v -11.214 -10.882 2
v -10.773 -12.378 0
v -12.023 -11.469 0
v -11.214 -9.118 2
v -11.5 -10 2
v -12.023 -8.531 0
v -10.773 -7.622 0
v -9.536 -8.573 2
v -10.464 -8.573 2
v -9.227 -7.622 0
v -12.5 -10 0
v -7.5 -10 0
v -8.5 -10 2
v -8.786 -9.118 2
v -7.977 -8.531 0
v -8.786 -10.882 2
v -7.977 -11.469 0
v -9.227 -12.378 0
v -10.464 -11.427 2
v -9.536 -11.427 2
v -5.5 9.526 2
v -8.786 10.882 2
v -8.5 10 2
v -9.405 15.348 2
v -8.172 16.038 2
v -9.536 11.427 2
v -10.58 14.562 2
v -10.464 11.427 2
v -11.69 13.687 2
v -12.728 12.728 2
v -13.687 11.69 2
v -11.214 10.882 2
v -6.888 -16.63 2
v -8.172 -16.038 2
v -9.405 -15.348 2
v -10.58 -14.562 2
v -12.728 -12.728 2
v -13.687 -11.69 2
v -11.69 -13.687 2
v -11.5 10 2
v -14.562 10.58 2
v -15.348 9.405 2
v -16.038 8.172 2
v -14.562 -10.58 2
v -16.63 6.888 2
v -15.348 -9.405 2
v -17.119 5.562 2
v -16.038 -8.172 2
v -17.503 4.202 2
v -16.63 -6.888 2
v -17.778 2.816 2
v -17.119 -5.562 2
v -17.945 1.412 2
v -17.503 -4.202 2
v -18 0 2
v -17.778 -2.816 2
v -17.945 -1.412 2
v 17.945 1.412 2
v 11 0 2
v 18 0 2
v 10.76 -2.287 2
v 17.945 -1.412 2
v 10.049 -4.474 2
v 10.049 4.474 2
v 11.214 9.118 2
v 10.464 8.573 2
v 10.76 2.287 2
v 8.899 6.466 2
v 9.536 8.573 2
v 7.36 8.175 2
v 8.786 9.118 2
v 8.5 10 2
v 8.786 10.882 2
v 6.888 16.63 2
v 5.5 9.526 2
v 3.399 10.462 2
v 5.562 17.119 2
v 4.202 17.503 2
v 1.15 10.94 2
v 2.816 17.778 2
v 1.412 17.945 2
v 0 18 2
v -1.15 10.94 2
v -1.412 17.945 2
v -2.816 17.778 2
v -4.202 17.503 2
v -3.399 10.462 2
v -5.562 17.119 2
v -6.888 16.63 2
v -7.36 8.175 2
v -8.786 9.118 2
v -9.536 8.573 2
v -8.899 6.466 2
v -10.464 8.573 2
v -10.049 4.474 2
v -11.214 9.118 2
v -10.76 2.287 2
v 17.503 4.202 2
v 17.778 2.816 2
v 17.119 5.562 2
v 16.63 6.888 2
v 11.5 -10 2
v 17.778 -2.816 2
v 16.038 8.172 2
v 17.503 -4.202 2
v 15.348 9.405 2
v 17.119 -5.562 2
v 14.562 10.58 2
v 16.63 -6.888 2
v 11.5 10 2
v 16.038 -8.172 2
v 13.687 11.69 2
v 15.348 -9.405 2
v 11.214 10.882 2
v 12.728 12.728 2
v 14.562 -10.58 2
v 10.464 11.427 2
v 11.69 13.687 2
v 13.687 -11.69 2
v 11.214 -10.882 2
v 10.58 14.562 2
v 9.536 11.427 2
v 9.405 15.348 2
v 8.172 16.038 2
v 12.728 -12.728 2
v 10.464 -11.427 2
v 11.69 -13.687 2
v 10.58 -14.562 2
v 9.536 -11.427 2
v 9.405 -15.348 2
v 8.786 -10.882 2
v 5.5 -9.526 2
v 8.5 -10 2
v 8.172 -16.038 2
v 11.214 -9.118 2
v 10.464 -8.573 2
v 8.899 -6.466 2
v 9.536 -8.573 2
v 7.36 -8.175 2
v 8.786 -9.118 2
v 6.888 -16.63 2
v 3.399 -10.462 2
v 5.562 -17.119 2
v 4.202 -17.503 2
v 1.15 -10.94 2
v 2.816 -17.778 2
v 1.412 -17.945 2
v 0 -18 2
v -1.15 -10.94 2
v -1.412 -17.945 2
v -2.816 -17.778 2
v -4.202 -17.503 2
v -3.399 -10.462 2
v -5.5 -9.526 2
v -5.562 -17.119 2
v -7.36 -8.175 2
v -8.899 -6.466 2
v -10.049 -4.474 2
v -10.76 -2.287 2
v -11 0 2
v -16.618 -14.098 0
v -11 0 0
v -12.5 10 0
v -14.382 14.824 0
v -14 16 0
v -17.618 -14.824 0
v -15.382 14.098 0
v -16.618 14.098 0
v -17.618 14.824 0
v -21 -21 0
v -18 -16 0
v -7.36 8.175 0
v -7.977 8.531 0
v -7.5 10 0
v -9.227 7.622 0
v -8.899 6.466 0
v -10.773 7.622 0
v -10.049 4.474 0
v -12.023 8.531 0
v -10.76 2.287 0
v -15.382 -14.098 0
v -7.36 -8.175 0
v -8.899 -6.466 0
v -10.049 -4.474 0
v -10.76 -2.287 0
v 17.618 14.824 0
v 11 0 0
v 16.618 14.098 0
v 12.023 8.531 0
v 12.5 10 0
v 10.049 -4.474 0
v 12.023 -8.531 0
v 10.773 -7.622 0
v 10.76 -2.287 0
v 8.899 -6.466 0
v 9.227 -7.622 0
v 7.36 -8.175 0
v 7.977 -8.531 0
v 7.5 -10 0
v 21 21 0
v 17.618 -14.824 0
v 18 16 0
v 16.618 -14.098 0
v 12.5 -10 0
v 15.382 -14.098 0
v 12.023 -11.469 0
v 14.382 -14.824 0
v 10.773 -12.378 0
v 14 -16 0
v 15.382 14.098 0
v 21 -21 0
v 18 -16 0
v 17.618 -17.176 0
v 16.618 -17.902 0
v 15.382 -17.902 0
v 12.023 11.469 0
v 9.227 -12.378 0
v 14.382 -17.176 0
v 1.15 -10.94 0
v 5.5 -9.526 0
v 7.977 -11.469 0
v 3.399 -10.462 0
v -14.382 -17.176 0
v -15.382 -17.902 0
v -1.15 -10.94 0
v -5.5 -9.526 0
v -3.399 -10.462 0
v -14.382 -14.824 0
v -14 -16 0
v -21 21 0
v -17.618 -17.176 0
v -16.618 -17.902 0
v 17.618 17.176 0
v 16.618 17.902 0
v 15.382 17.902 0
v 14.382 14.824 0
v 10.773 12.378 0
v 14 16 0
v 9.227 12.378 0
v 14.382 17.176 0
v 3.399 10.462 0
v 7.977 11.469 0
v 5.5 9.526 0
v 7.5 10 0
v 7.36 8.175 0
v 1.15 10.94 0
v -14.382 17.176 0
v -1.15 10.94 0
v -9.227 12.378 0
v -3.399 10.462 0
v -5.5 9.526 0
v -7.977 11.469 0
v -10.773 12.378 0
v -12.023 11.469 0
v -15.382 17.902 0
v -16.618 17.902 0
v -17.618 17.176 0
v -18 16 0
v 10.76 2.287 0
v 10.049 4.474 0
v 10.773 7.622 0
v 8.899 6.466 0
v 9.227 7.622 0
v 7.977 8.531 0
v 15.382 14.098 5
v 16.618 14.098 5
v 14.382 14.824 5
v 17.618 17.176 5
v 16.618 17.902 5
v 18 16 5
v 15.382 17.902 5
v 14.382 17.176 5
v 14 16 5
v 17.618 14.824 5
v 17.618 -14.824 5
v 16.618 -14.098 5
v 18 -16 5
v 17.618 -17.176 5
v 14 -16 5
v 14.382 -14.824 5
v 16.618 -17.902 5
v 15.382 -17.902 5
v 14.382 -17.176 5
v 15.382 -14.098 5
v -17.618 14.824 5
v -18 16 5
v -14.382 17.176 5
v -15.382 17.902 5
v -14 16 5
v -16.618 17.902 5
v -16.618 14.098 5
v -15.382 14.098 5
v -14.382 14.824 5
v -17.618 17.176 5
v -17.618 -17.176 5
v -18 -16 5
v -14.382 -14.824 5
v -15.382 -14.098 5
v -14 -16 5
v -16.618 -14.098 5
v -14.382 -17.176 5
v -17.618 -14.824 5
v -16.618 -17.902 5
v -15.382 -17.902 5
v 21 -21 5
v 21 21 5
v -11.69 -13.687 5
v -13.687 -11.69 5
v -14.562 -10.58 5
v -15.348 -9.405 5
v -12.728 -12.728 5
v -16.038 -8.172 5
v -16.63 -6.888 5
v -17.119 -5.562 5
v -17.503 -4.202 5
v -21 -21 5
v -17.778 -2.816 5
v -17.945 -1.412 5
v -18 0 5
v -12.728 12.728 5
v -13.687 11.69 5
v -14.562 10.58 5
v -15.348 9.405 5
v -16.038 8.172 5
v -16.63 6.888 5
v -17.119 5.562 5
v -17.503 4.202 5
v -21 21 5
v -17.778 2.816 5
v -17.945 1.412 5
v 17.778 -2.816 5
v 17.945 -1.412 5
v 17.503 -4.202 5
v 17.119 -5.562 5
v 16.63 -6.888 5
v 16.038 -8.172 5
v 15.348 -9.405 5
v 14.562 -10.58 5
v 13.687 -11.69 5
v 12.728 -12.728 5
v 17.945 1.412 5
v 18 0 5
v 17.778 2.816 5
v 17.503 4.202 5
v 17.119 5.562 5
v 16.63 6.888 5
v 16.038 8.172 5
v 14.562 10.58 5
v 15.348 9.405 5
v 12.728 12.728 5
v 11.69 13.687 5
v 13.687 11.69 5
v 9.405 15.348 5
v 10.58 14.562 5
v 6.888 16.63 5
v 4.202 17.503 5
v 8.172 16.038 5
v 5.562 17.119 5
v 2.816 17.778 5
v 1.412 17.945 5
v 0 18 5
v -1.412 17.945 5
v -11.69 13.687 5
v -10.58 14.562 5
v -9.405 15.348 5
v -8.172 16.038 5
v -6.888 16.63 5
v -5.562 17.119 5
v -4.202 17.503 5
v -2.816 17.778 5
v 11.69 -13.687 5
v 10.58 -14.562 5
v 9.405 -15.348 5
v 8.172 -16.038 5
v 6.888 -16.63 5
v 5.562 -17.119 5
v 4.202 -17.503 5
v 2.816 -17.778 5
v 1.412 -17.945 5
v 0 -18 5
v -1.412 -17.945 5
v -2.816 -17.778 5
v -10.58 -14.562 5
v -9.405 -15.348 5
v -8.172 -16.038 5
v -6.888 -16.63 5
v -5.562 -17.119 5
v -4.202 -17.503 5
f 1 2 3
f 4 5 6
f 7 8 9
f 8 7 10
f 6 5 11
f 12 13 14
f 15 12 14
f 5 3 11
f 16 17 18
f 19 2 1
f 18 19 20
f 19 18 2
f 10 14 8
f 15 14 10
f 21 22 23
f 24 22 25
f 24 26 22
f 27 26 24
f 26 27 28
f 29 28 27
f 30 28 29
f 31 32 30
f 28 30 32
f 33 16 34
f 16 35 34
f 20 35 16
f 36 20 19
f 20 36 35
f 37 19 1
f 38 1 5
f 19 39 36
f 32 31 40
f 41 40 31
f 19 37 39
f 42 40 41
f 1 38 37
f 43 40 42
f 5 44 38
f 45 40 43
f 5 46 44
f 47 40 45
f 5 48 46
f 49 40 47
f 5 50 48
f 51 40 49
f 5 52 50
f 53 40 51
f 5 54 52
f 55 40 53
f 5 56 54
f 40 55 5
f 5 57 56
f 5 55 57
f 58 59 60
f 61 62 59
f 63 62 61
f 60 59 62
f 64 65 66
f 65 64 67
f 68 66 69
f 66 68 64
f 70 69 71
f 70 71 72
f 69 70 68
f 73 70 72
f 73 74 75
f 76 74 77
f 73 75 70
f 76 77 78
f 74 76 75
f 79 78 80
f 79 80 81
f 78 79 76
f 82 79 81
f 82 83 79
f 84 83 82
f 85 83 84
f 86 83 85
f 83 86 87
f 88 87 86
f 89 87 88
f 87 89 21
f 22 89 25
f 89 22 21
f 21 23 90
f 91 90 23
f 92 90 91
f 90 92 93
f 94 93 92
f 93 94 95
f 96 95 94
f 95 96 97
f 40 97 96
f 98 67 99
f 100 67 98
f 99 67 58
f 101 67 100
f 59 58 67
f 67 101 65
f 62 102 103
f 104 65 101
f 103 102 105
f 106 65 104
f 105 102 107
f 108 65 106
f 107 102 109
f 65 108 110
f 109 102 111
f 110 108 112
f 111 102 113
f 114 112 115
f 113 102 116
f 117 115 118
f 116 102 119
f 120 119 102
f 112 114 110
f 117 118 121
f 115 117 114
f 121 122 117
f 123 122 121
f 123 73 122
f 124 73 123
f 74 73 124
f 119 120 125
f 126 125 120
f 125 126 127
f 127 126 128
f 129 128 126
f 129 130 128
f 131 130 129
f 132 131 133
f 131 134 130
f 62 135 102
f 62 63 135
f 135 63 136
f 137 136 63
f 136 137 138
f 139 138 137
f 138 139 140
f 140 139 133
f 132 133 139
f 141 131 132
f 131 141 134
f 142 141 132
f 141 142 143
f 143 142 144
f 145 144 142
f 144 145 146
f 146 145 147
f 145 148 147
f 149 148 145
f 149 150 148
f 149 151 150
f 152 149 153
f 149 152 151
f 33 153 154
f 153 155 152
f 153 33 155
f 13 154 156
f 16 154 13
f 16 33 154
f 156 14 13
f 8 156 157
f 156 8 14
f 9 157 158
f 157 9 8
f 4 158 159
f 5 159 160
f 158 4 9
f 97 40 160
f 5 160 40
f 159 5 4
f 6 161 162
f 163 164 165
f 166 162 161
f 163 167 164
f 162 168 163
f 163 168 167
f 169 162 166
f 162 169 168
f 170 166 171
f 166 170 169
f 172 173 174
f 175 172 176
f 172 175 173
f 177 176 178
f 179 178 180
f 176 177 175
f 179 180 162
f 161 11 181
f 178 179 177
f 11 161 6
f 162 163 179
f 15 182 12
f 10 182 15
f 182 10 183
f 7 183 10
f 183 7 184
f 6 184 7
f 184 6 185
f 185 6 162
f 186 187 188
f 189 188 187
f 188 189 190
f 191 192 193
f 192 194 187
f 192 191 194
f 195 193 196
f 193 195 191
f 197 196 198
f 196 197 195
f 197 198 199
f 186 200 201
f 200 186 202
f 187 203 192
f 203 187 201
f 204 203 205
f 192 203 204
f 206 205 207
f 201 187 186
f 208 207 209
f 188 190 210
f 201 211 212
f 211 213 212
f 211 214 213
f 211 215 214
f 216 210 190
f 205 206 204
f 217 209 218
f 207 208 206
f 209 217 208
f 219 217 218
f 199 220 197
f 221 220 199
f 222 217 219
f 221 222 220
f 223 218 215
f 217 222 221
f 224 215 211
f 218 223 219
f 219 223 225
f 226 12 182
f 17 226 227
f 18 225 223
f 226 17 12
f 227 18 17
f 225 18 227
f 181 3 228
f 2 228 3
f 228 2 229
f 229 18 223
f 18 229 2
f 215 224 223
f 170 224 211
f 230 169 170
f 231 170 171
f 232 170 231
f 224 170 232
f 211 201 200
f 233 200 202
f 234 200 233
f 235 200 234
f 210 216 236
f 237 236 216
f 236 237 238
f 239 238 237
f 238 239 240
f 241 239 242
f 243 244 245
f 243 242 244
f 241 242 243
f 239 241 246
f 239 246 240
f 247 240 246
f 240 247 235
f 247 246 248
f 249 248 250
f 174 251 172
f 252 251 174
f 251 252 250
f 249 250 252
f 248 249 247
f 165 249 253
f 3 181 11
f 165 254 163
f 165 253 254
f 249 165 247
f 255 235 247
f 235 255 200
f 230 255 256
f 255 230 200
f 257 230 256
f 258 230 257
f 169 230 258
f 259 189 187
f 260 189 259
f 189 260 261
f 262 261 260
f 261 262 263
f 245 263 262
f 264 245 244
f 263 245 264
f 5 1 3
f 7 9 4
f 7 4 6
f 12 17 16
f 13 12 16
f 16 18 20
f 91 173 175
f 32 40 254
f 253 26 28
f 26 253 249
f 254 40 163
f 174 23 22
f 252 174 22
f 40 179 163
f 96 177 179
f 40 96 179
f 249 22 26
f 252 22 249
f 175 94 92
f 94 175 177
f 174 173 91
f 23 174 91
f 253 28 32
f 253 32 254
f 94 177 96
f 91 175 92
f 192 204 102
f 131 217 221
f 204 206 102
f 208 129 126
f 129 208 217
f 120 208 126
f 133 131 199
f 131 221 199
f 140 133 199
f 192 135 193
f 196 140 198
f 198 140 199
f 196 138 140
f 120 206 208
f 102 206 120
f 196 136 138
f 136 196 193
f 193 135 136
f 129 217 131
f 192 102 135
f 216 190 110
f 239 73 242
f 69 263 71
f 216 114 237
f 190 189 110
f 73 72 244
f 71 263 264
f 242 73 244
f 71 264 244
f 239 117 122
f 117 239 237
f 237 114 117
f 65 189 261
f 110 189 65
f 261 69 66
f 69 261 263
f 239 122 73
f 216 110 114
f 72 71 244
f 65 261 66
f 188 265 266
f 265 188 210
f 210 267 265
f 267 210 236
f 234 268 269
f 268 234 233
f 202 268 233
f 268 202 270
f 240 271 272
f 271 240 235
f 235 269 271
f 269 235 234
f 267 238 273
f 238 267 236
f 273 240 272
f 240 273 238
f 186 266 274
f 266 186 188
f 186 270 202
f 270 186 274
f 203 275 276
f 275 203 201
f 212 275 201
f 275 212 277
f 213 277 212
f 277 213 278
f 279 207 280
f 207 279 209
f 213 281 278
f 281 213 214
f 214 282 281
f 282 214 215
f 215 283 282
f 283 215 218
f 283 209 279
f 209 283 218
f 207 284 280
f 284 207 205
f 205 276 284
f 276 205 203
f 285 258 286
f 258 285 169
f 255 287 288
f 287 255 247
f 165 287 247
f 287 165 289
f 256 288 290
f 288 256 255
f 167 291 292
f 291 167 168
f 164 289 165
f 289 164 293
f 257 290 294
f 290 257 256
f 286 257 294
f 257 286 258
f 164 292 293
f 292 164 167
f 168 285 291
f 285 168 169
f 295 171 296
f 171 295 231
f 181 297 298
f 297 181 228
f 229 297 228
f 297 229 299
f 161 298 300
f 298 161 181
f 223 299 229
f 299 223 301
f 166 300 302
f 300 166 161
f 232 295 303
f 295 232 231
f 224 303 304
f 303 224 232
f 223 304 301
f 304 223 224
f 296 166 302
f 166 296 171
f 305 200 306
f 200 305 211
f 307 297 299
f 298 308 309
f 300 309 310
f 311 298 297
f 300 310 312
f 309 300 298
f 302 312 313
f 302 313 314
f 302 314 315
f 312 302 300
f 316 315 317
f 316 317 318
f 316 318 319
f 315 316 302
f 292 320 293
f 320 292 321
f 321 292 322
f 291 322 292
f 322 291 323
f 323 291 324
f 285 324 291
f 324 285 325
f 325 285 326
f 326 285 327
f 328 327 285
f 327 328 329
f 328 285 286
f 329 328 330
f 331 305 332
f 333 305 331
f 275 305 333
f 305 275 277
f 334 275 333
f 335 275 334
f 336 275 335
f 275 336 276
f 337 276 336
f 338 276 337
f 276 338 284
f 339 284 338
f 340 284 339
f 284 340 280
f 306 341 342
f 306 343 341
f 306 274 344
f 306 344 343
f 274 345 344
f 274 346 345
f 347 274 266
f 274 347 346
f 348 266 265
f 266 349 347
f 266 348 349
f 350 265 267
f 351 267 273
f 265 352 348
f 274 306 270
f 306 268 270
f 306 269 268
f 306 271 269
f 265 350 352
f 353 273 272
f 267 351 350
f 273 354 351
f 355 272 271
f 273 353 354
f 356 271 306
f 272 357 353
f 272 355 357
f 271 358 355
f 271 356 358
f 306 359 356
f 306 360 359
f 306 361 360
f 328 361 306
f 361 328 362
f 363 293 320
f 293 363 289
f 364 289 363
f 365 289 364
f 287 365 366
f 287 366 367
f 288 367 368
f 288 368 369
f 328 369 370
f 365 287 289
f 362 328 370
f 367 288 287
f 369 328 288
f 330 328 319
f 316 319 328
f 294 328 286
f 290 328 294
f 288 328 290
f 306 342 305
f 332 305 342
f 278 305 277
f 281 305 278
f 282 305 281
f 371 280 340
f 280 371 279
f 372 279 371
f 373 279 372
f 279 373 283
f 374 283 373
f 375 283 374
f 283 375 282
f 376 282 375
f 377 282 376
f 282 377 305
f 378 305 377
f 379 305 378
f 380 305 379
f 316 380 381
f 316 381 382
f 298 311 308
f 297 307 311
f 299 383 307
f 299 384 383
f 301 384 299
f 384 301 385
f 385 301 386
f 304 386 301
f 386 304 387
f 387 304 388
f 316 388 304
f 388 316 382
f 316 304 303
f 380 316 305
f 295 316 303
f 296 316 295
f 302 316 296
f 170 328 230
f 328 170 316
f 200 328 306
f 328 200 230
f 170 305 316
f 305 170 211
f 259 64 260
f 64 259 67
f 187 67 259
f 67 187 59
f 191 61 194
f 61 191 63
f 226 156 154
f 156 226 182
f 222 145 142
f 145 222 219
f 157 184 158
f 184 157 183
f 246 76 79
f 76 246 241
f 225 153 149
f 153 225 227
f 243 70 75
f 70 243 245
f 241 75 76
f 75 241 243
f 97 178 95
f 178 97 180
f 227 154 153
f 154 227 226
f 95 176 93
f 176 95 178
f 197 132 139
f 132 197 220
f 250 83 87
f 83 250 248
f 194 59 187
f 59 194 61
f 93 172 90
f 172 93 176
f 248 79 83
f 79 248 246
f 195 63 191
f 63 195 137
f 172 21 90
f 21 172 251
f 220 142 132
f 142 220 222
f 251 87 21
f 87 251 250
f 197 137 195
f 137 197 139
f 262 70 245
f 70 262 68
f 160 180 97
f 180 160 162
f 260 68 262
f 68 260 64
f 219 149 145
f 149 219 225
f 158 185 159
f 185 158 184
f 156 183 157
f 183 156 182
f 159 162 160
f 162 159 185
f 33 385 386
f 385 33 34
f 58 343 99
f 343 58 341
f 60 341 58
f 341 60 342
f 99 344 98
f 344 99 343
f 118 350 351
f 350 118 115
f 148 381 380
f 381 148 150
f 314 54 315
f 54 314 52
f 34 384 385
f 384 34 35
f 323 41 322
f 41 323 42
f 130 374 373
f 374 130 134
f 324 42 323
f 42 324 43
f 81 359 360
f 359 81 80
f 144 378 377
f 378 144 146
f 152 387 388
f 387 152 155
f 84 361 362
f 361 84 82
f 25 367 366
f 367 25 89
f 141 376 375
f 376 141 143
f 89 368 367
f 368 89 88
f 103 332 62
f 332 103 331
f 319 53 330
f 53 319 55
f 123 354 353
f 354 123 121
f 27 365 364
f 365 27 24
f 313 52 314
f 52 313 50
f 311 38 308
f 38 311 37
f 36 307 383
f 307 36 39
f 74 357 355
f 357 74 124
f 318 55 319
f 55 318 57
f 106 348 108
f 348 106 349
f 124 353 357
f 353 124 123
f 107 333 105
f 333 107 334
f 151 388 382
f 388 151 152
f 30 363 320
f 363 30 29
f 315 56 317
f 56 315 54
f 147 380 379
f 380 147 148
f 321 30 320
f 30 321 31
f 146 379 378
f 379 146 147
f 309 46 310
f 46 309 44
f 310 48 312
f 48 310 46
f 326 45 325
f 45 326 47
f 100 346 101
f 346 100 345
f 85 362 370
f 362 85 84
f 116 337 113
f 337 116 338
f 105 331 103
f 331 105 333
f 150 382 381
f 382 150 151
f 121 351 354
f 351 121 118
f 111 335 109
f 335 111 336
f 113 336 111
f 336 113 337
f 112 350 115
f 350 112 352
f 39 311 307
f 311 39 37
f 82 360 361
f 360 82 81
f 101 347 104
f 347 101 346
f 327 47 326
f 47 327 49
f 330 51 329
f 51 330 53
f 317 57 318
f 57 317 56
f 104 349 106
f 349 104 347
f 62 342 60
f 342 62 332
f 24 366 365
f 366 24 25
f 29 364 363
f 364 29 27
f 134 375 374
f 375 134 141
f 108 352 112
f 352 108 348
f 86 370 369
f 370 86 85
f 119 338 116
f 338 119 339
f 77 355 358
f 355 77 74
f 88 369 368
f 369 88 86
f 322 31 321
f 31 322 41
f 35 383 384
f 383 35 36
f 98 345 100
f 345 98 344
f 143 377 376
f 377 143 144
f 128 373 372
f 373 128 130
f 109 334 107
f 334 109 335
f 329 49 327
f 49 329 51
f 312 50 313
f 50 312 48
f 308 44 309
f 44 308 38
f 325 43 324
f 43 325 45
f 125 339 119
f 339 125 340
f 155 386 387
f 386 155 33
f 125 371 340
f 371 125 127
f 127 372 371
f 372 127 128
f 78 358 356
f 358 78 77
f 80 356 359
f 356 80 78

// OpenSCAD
// file: tolerance.scad
// Author: Mihai Oltean, https://mihaioltean.github.io, mihai.oltean@gmail.com
// More details: jenny5.org
// Source: github.com/jenny5-robot
// MIT License
//--------------------------------------------------------------

tolerance = 0.1;
display_tolerance = 1;

overlap_tolerance = 0.01;

tolerance_z = [0, 0, tolerance];
tolerance_x = [tolerance, 0, 0];
tolerance_y = [0, tolerance, 0];

display_tolerance_z = [0, 0, display_tolerance];
display_tolerance_x = [display_tolerance, 0, 0];
display_tolerance_y = [0, display_tolerance, 0];

display_tolerance_xz = [display_tolerance, 0, display_tolerance];
display_tolerance_xy = [display_tolerance, display_tolerance, 0];
display_tolerance_yz = [0, display_tolerance, display_tolerance];

display_tolerance_xyz = [display_tolerance, display_tolerance, display_tolerance];
// file: config.scad
// Author: Mihai Oltean, www.tcreate.org, mihai.oltean@gmail.com
// More details: jenny5.org
// Source: github.com/jenny5-robot
// MIT License
//--------------------------------------------------------------

aluminium_color = "Silver";
screw_color = "LightSlateGray";
frame_color = aluminium_color;
shaft_color = "Silver";
plastic_color = "LimeGreen";
pulley_color = "DarkSlateGray";
steel_color = "LightSlateGray";
// file: params_basic_components.scad
// Author: Mihai Oltean, https://mihaioltean.github.io, mihai.oltean@gmail.com
// More details: jenny5.org
// Source: github.com/jenny5-robot
// MIT License
//--------------------------------------------------------------

spring_length = 20;

smooth_rod_8_radius = 4;
smooth_rod_10_radius = 5;
smooth_rod_12_radius = 6;

wall_thick_1 = 1;
wall_thick_2 = 2;
wall_thick_3 = 3;
wall_thick_4 = 4;
wall_thick_5 = 5;
wall_thick_5_5 = 5.5;
wall_thick_6 = 6;
wall_thick_7 = 7;
wall_thick_8 = 8;
wall_thick_9 = 9;
wall_thick_10 = 10;
wall_thick_12 = 12;
// file: params_stepper_motors.scad
// Author: Mihai Oltean, www.tcreate.org, mihai.oltean@gmail.com
// More details: jenny5.org
// Source: github.com/jenny5-robot
// MIT License
//--------------------------------------------------------------

nema_17_width = 42.3;
nema_17_motor_height_sparkfun = 36;
nema_17_motor_hole_radius_sparkfun  = 14;
nema_17_motor_hole_radius_camiel  = 12;
nema_17_dist_between_screw_holes = 31;
nema_17_height = 47;
nema_17_shaft_length = 24;

nema_14_width = 39.3;
nema_14_motor_hole_radius  = 11;
nema_14_dist_between_screw_holes = 31;
nema_14_height = 47;
nema_14_shaft_length = 20;

nema_11_width = 28;
nema_11_motor_hole_radius = 11;
nema_11_dist_between_screw_holes = 23;
nema_11_height = 32;
nema_11_shaft_length = 18;
nema_11_shaft_radius = 3;

nema_11_27_1_gearbox_length = 34;
nema_11_13_1_gearbox_length = 25;
nema_11_gearbox_base_height = 4;
nema_11_motor_gearbox_radius = 14;
nema_11_motor_gearbox_hole_radius = 9;
nema_11_gearbox_dist_between_screw_holes = 22 / sqrt(2);
nema_11_gearbox_shaft_length = 18;

nema_11_with_27_1_gearbox_height = nema_11_height + nema_11_gearbox_base_height + nema_11_27_1_gearbox_length;
nema_11_with_13_1_gearbox_height = nema_11_height + nema_11_gearbox_base_height + nema_11_13_1_gearbox_length;

nema_17_motor_gearbox_radius = 18;
nema_17_gearbox_dist_between_screw_holes = 20;
nema_17_5_1_gearbox_height = 23;
nema_17_13_1_gearbox_height = 30;
nema_17_19_1_gearbox_height = 36;
nema_17_50_1_gearbox_height = 38;

nema_17_gearbox_base_height = 5;
nema_17_gearbox_shaft_length = 18;
nema_17_gearbox_shaft_radius = 4;
nema_17_gearbox_motor_hole_radius = 11;

nema_17_with_5_1_gearbox_height = nema_17_height + nema_17_gearbox_base_height + nema_17_5_1_gearbox_height;
nema_17_with_13_1_gearbox_height = nema_17_height + nema_17_gearbox_base_height + nema_17_13_1_gearbox_height;
nema_17_with_19_1_gearbox_height = nema_17_height + nema_17_gearbox_base_height + nema_17_19_1_gearbox_height;
nema_17_with_50_1_gearbox_height = nema_17_height + nema_17_gearbox_base_height + nema_17_50_1_gearbox_height;

nema_17_42BYGHW804_width = 42.3;
nema_17_42BYGHW804_height = 47;
nema_17_42BYGHW804_top_radius = 11;
nema_17_42BYGHW804_top_cylinder_height = 2;
nema_17_42BYGHW804_dist_between_screw_holes = 31;
nema_17_42BYGHW804_shaft_length = 22;
nema_17_42BYGHW804_shaft_radius = 2.5;

nema_23_57BYGH603_width = 56.4;
nema_23_57BYGH603_height = 78;
nema_23_57BYGH603_hole_radius  = 19.1;
nema_23_57BYGH603_dist_between_screw_holes = 47.14;
nema_23_57BYGH603_shaft_length = 21;

nema_14_39BYGL215A_width = 39;
nema_14_39BYGL215A_height = 34;
nema_14_39BYGL215A_top_radius = 11;
nema_14_39BYGL215A_dist_between_screw_holes = 31;
nema_14_39BYGL215A_shaft_length = 50;
nema_14_39BYGL215A_shaft_radius = 2.5;
nema_14_39BYGL215A_top_cylinder_height = 2;


nema_11_sizes = [nema_11_width, nema_11_width, nema_11_height];

gauri_nema_17 = [
[0, 0, 0], 
[-nema_17_dist_between_screw_holes / 2, -nema_17_dist_between_screw_holes / 2, 0], 
[-nema_17_dist_between_screw_holes / 2, nema_17_dist_between_screw_holes / 2, 0], 
[nema_17_dist_between_screw_holes / 2, -nema_17_dist_between_screw_holes / 2, 0], 
[nema_17_dist_between_screw_holes / 2, nema_17_dist_between_screw_holes / 2, 0]
];

nema_14_39BYGL215A_screw_hole_position = [
[0, 0, 0], 
[-nema_14_39BYGL215A_dist_between_screw_holes / 2, -nema_14_39BYGL215A_dist_between_screw_holes / 2, 0], 
[-nema_14_39BYGL215A_dist_between_screw_holes / 2, nema_14_39BYGL215A_dist_between_screw_holes / 2, 0], 
[nema_14_39BYGL215A_dist_between_screw_holes / 2, -nema_14_39BYGL215A_dist_between_screw_holes / 2, 0], 
[nema_14_39BYGL215A_dist_between_screw_holes / 2, nema_14_39BYGL215A_dist_between_screw_holes / 2, 0]
];


gauri_nema_11 = [
[0, 0, 0], 
[-nema_11_dist_between_screw_holes / 2, -nema_11_dist_between_screw_holes / 2, 0], 
[-nema_11_dist_between_screw_holes / 2, nema_11_dist_between_screw_holes / 2, 0], 
[nema_11_dist_between_screw_holes / 2, -nema_11_dist_between_screw_holes / 2, 0], 
[nema_11_dist_between_screw_holes / 2, nema_11_dist_between_screw_holes / 2, 0]
];

gearbox_nema_11_holes_position = [
[0, 0, 0], 
[-nema_11_gearbox_dist_between_screw_holes / 2, -nema_11_gearbox_dist_between_screw_holes / 2, 0], 
[-nema_11_gearbox_dist_between_screw_holes / 2, nema_11_gearbox_dist_between_screw_holes / 2, 0], 
[nema_11_gearbox_dist_between_screw_holes / 2, -nema_11_gearbox_dist_between_screw_holes / 2, 0], 
[nema_11_gearbox_dist_between_screw_holes / 2, nema_11_gearbox_dist_between_screw_holes / 2, 0]
];

gearbox_nema_17_holes_position = [
[0, 0, 0], 
[-nema_17_gearbox_dist_between_screw_holes / 2, -nema_17_gearbox_dist_between_screw_holes / 2, 0], 
[-nema_17_gearbox_dist_between_screw_holes / 2, nema_17_gearbox_dist_between_screw_holes / 2, 0], 
[nema_17_gearbox_dist_between_screw_holes / 2, -nema_17_gearbox_dist_between_screw_holes / 2, 0], 
[nema_17_gearbox_dist_between_screw_holes / 2, nema_17_gearbox_dist_between_screw_holes / 2, 0]
];

gearbox_nema_17_holes_radius = [nema_17_gearbox_motor_hole_radius, 1.5, 1.5, 1.5, 1.5];
// file: params_stepper_motor_gearbox.scad
nema_17_gearbox_sheet_size = [42, 42, 5];


dist_to_screw_hole_position = 5;

nema17_gearbox_tensioner_sheet_screw_hole_position = [
[0, 0, 0],
[nema_17_gearbox_sheet_size[0] / 2 - dist_to_screw_hole_position, nema_17_gearbox_sheet_size[0] / 2 - dist_to_screw_hole_position, 0],
[nema_17_gearbox_sheet_size[0] / 2 - dist_to_screw_hole_position, -(nema_17_gearbox_sheet_size[0] / 2 - dist_to_screw_hole_position), 0],
[-(nema_17_gearbox_sheet_size[0] / 2 - dist_to_screw_hole_position), nema_17_gearbox_sheet_size[0] / 2 - dist_to_screw_hole_position, 0],
[-(nema_17_gearbox_sheet_size[0] / 2 - dist_to_screw_hole_position), -(nema_17_gearbox_sheet_size[0] / 2 - dist_to_screw_hole_position), 0]

];

nema_17_gearbox_sheet_base_wall_thick = 2;
// main file
// Author: Mihai Oltean, 
// https://mihaioltean.github.io, mihai.oltean@gmail.com
// More details: jenny5.org
// Source: github.com/jenny5-robot
// MIT License
//--------------------------------------------------------------

include <params_stepper_motor_gearbox.scad>
include <params_stepper_motors.scad>
include <params_basic_components.scad>
include <config.scad>
include <tolerance.scad>

//--------------------------------------------------------------
module stepper_gearbox_motor_sheet(sheet_size, gearbox_hole_position, screw_hole_position, gearbox_hole_radius, gearbox_radius)
{
    difference(){
        translate ([-sheet_size[0] / 2, -sheet_size[1] / 2, 0]) cube(sheet_size);
        // middle hole
        translate (-display_tolerance_z) cylinder(h = sheet_size[2] + 2 * display_tolerance, r = gearbox_hole_radius);
        translate ([0, 0, nema_17_gearbox_sheet_base_wall_thick]) cylinder(h = sheet_size[2], r = gearbox_radius,$fn = 80);
        // gearbox holes
        for (i = [1 : 4])
            translate (+ gearbox_hole_position[i]) cylinder(h = nema_17_gearbox_sheet_base_wall_thick , r2 = 1.5, r1 = 2.5, $fn = 10);

// screw holes for belt tensioner        
        for (i = [0 : 4])
            translate (-display_tolerance_z + screw_hole_position[i]) cylinder(h = sheet_size[2] + 2 * display_tolerance, r = 2, $fn = 10);
    }
}
//--------------------------------------------------------------
stepper_gearbox_motor_sheet(nema_17_gearbox_sheet_size, gearbox_nema_17_holes_position, nema17_gearbox_tensioner_sheet_screw_hole_position, nema_17_gearbox_motor_hole_radius, nema_17_motor_gearbox_radius);
